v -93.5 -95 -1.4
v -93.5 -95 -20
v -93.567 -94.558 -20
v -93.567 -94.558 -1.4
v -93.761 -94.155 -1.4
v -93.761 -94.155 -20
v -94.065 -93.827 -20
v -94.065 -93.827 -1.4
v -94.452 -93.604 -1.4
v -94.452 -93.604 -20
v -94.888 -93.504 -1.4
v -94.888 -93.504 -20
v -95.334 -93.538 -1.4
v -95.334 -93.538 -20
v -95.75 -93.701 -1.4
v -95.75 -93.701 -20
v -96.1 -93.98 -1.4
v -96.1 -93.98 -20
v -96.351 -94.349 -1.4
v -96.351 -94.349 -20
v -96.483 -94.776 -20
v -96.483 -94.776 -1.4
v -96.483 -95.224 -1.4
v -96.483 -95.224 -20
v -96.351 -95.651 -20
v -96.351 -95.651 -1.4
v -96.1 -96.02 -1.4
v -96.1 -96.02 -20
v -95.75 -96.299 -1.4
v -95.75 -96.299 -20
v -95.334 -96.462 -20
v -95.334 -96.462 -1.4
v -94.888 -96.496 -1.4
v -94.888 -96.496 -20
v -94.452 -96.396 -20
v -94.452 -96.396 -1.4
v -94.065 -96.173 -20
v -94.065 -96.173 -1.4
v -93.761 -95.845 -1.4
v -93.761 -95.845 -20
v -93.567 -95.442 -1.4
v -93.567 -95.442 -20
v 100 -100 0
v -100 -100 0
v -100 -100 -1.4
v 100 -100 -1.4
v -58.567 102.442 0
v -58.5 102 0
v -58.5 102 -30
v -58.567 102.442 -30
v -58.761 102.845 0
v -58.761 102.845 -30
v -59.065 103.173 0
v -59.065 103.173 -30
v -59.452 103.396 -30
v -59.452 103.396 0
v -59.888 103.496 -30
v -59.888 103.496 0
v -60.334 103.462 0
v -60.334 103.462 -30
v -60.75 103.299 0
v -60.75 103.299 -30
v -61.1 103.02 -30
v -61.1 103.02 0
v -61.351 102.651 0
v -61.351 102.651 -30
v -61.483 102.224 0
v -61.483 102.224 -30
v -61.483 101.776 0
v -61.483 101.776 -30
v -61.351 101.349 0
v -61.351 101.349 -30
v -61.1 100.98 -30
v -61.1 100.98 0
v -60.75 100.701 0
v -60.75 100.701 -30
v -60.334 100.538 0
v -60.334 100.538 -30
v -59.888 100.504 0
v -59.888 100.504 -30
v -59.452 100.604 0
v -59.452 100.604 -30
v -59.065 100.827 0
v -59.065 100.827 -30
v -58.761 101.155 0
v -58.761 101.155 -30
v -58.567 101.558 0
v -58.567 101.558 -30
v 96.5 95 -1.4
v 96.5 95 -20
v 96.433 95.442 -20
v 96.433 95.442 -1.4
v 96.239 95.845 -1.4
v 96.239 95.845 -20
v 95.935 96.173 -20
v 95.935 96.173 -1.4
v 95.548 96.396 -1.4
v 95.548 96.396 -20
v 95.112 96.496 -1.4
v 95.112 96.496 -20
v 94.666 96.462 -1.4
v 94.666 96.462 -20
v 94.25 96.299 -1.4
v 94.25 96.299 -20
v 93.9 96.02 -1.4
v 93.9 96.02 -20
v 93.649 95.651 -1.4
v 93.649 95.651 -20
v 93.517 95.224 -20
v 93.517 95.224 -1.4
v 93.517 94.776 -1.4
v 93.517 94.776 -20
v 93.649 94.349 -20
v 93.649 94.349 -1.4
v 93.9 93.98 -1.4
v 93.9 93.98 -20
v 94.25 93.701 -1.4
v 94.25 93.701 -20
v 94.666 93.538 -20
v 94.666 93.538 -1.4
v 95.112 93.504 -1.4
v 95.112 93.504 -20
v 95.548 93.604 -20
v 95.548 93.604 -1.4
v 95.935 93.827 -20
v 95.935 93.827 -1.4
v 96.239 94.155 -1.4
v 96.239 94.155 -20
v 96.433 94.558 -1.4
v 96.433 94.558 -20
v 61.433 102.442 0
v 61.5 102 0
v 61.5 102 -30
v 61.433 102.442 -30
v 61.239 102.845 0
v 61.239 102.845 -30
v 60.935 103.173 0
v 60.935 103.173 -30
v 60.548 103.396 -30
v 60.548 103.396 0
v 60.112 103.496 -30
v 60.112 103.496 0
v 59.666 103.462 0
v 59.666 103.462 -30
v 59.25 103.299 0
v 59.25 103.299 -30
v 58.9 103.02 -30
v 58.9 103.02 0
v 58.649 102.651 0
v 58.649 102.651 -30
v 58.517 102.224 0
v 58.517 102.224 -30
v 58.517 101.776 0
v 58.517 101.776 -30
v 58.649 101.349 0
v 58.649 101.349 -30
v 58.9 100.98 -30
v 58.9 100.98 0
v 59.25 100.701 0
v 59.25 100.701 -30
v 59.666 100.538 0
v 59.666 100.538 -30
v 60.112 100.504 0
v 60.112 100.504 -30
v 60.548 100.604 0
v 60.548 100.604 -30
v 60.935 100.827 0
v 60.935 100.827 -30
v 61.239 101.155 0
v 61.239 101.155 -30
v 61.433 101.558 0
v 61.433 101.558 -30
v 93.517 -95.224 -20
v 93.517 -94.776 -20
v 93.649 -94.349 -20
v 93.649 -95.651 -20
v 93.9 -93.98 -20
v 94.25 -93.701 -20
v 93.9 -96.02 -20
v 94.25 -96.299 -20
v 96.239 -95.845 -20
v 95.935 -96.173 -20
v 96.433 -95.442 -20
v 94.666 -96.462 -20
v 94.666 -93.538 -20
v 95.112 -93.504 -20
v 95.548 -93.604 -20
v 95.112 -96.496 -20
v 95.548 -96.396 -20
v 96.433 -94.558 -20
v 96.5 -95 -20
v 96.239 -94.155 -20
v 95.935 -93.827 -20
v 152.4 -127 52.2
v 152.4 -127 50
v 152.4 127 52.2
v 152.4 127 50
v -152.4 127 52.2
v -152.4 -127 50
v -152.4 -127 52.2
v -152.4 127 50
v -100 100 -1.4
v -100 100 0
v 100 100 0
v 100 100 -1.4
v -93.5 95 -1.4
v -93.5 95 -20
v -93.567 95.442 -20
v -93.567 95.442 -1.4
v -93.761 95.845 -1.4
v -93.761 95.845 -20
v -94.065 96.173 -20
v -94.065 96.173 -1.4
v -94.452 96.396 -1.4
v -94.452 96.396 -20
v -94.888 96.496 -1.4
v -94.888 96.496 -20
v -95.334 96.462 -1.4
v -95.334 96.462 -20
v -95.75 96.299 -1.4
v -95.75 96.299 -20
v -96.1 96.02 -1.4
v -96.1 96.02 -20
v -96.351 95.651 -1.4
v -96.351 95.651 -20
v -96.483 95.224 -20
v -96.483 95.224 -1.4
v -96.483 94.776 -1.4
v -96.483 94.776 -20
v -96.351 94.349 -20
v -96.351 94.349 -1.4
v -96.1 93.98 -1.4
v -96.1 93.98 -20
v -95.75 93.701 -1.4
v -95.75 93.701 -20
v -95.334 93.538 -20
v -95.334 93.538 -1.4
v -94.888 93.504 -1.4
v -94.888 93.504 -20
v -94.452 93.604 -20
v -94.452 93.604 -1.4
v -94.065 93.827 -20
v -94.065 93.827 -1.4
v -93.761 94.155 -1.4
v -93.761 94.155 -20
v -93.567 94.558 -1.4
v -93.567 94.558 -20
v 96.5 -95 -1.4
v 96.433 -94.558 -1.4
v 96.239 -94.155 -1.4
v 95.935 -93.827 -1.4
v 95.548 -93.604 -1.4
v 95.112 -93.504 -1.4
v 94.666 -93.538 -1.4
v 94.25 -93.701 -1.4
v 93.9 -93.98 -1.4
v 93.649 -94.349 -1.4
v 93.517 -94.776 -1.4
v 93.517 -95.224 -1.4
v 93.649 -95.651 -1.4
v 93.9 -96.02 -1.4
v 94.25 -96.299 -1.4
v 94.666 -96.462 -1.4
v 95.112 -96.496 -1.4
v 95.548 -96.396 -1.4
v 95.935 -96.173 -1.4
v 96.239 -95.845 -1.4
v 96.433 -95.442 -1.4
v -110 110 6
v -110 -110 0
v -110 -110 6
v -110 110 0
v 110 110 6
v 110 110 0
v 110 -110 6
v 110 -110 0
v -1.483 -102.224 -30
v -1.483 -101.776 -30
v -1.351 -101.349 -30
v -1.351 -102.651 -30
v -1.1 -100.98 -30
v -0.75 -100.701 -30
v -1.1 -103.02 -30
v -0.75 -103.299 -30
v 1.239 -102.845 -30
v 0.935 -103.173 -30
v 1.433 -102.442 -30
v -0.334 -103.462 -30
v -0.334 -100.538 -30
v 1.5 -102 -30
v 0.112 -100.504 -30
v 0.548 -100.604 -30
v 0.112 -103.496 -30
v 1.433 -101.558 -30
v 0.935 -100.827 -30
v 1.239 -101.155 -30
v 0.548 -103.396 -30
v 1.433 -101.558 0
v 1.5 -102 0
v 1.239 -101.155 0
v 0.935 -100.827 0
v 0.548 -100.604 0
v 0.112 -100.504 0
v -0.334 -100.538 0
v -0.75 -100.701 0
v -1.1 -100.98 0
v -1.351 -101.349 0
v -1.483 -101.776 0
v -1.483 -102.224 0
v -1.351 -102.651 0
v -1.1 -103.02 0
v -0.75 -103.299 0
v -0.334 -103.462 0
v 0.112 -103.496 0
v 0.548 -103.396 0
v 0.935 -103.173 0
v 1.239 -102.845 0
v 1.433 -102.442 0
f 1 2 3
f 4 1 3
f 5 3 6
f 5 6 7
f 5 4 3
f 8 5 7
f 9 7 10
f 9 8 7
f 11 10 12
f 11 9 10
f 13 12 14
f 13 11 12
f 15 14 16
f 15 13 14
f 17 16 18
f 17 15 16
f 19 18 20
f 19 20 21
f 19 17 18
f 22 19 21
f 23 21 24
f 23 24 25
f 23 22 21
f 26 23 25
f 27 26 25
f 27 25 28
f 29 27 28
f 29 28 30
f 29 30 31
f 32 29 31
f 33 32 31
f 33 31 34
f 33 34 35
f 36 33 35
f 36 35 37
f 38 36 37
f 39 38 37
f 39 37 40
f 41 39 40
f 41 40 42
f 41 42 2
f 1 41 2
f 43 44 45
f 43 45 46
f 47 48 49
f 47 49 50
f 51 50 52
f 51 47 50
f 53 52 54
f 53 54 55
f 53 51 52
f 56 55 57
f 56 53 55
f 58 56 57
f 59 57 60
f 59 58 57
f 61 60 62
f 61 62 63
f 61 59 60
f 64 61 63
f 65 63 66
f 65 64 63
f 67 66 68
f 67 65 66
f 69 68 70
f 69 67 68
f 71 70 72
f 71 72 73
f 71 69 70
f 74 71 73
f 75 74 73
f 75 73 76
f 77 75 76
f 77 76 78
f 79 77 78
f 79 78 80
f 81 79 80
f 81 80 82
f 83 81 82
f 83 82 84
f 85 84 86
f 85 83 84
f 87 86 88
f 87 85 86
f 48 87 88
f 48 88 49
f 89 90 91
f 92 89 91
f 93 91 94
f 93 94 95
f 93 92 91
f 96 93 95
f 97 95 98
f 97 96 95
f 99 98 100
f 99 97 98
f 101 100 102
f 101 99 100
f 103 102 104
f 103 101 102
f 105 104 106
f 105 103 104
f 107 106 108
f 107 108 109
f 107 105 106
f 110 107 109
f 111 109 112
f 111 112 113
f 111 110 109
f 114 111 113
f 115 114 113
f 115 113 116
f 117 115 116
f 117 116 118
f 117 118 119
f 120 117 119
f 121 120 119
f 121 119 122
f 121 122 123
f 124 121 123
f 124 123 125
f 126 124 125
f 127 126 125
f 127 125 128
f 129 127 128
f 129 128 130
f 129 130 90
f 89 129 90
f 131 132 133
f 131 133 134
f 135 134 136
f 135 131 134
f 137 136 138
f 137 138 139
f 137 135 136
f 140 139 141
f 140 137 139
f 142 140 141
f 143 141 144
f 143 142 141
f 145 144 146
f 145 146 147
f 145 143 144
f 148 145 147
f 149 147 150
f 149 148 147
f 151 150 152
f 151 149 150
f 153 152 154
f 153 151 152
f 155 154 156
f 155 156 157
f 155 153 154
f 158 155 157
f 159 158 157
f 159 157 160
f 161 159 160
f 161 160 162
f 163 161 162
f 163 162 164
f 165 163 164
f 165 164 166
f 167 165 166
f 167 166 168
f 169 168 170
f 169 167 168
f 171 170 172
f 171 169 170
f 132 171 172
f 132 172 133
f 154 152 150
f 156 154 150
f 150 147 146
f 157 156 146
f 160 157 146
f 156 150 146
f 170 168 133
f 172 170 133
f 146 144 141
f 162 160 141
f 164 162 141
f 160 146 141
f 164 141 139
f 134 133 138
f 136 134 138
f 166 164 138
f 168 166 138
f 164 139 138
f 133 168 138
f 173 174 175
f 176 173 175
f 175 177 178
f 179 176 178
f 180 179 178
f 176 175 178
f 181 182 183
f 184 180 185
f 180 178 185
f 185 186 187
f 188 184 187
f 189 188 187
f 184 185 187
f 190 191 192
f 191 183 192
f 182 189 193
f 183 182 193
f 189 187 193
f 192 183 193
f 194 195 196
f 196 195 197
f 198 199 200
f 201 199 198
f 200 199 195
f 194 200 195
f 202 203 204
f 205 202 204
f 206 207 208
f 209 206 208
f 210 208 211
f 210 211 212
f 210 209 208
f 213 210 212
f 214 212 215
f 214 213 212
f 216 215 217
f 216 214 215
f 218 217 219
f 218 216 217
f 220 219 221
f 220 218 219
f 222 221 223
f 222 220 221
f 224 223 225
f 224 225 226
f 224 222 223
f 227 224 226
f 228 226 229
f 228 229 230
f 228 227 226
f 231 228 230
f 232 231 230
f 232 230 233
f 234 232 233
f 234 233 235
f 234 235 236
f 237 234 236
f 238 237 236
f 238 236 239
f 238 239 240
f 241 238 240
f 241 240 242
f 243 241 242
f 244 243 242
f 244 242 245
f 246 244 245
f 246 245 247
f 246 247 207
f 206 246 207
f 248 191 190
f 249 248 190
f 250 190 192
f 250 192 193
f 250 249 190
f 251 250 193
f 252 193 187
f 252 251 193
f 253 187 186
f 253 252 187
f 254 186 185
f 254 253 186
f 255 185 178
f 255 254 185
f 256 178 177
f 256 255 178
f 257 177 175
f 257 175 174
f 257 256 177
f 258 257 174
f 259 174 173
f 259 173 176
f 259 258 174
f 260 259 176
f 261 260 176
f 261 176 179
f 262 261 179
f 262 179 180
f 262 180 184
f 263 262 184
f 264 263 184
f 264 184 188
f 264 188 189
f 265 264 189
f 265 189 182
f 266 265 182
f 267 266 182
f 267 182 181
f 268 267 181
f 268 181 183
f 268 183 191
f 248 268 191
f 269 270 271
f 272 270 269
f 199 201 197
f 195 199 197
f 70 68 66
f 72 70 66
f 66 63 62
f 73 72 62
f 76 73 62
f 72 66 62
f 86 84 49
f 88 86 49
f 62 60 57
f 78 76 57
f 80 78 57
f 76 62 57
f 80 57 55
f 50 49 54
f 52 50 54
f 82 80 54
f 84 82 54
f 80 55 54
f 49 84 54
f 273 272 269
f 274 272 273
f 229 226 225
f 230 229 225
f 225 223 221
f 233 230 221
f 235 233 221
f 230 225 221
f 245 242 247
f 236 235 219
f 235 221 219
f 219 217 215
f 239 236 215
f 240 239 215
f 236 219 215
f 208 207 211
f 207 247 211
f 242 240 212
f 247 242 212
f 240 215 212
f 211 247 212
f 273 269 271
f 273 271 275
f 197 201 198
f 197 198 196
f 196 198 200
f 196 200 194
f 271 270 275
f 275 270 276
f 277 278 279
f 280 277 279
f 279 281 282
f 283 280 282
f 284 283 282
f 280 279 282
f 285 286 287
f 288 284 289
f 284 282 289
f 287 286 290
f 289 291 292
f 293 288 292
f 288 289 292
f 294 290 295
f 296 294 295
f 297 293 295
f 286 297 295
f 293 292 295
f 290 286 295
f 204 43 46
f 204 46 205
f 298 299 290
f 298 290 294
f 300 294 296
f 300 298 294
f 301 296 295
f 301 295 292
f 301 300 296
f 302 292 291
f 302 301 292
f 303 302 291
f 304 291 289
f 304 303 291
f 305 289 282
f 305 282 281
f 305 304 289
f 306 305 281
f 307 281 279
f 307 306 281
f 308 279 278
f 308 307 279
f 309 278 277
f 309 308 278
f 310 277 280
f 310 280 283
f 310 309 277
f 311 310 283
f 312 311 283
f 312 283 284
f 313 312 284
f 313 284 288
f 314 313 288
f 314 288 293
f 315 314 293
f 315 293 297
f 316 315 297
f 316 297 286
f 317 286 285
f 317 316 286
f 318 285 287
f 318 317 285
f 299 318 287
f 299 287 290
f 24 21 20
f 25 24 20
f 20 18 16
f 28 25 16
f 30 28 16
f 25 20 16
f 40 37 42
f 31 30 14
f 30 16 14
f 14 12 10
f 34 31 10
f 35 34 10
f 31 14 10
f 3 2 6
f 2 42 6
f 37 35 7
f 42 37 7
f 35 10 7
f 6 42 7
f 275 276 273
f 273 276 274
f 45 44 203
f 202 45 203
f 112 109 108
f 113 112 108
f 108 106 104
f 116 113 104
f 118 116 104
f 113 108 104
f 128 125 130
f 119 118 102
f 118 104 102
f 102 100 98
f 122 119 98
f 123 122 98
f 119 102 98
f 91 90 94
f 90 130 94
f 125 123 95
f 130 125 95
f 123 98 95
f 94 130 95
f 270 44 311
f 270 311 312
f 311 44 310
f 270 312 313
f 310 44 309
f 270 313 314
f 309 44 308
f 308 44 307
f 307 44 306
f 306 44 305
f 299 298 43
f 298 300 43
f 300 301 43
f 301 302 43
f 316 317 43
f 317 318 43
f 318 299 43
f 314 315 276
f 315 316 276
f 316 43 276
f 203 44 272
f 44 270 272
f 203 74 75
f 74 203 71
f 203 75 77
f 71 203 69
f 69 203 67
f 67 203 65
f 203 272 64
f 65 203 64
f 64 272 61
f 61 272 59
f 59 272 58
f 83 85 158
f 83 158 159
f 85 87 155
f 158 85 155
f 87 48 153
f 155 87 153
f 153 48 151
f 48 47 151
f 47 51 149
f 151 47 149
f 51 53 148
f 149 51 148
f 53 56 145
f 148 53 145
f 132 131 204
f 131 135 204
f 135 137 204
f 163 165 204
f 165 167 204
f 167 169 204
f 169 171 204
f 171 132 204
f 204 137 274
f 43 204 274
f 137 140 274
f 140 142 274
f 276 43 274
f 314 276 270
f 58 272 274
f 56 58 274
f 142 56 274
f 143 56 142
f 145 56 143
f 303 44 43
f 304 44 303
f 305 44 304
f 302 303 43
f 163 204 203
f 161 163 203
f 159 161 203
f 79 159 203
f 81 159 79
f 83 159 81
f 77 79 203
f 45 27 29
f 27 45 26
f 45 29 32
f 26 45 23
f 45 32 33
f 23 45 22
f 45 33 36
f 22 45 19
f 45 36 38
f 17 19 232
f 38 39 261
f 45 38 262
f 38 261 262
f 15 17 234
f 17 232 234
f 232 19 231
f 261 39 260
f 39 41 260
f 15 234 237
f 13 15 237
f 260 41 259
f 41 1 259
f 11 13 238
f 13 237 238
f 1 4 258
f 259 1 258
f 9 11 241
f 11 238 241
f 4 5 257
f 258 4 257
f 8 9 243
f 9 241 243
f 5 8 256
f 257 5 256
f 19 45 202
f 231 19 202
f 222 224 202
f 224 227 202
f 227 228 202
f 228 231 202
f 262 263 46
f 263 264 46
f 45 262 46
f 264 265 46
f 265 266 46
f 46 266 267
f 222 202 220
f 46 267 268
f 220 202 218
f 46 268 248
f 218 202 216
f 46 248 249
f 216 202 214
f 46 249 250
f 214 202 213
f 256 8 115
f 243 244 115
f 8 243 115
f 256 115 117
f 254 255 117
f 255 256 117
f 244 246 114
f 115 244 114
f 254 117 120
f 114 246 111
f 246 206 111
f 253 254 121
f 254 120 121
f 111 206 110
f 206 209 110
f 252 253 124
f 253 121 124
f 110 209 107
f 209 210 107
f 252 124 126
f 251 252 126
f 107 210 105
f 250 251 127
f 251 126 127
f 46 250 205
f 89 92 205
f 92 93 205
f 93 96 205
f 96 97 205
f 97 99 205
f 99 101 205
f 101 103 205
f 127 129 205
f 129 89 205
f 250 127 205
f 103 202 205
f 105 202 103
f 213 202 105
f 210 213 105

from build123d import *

# Parameters (mm, degrees)
F0_W     = 220
F0_H     = 220
F0_R     = 1.5
F0_W_2   = 200
F0_H_2   = 200
F1_DEPTH = 6
F2_DEPTH = 1.4
F3_DEPTH = 20
F4_DEPTH = 30
F7_W     = 304.8
F7_H     = 254
F8_DEPTH = 2.2


with BuildPart() as f1:
    # F0 (on Top) → F1 (new body)
    with BuildSketch(Plane.XY):
        Rectangle(F0_W, F0_H)
        with Locations((0, -102)):
            Circle(F0_R, mode=Mode.SUBTRACT)
        with Locations((-60, 102)):
            Circle(F0_R, mode=Mode.SUBTRACT)
        Rectangle(F0_W_2, F0_H_2, mode=Mode.SUBTRACT)
        with Locations((60, 102)):
            Circle(F0_R, mode=Mode.SUBTRACT)
        Rectangle(F0_W_2, F0_H_2)
        with Locations((-95, -95)):
            Circle(F0_R, mode=Mode.SUBTRACT)
        with Locations((95, -95)):
            Circle(F0_R, mode=Mode.SUBTRACT)
        with Locations((-95, 95)):
            Circle(F0_R, mode=Mode.SUBTRACT)
        with Locations((95, 95)):
            Circle(F0_R, mode=Mode.SUBTRACT)
        with Locations((-95, 95)):
            Circle(F0_R)
        with Locations((-60, 102)):
            Circle(F0_R)
        with Locations((60, 102)):
            Circle(F0_R)
        with Locations((95, 95)):
            Circle(F0_R)
        with Locations((-95, -95)):
            Circle(F0_R)
        with Locations((0, -102)):
            Circle(F0_R)
        with Locations((95, -95)):
            Circle(F0_R)
    extrude(amount=F1_DEPTH)

    # F0 (on Top) → F2 (join)
    with BuildSketch(Plane.XY):
        Rectangle(F0_W_2, F0_H_2)
        with Locations((-95, -95)):
            Circle(F0_R, mode=Mode.SUBTRACT)
        with Locations((95, -95)):
            Circle(F0_R, mode=Mode.SUBTRACT)
        with Locations((-95, 95)):
            Circle(F0_R, mode=Mode.SUBTRACT)
        with Locations((95, 95)):
            Circle(F0_R, mode=Mode.SUBTRACT)
    extrude(amount=-F2_DEPTH)

    # F0 (on Top) → F3 (join)
    with BuildSketch(Plane.XY):
        with Locations((-95, -95)):
            Circle(F0_R)
        with Locations((95, -95)):
            Circle(F0_R)
        with Locations((-95, 95)):
            Circle(F0_R)
        with Locations((95, 95)):
            Circle(F0_R)
    extrude(amount=-F3_DEPTH)

    # F0 (on Top) → F4 (join)
    with BuildSketch(Plane.XY):
        with Locations((0, -102)):
            Circle(F0_R)
        with Locations((-60, 102)):
            Circle(F0_R)
        with Locations((60, 102)):
            Circle(F0_R)
    extrude(amount=-F4_DEPTH)


with BuildPart() as f8:
    # F7 (on offset) → F8 (new body)
    with BuildSketch(Plane.XY.offset(50)):
        Rectangle(F7_W, F7_H)
    extrude(amount=F8_DEPTH)


solid = Compound([f1.part, f8.part])
